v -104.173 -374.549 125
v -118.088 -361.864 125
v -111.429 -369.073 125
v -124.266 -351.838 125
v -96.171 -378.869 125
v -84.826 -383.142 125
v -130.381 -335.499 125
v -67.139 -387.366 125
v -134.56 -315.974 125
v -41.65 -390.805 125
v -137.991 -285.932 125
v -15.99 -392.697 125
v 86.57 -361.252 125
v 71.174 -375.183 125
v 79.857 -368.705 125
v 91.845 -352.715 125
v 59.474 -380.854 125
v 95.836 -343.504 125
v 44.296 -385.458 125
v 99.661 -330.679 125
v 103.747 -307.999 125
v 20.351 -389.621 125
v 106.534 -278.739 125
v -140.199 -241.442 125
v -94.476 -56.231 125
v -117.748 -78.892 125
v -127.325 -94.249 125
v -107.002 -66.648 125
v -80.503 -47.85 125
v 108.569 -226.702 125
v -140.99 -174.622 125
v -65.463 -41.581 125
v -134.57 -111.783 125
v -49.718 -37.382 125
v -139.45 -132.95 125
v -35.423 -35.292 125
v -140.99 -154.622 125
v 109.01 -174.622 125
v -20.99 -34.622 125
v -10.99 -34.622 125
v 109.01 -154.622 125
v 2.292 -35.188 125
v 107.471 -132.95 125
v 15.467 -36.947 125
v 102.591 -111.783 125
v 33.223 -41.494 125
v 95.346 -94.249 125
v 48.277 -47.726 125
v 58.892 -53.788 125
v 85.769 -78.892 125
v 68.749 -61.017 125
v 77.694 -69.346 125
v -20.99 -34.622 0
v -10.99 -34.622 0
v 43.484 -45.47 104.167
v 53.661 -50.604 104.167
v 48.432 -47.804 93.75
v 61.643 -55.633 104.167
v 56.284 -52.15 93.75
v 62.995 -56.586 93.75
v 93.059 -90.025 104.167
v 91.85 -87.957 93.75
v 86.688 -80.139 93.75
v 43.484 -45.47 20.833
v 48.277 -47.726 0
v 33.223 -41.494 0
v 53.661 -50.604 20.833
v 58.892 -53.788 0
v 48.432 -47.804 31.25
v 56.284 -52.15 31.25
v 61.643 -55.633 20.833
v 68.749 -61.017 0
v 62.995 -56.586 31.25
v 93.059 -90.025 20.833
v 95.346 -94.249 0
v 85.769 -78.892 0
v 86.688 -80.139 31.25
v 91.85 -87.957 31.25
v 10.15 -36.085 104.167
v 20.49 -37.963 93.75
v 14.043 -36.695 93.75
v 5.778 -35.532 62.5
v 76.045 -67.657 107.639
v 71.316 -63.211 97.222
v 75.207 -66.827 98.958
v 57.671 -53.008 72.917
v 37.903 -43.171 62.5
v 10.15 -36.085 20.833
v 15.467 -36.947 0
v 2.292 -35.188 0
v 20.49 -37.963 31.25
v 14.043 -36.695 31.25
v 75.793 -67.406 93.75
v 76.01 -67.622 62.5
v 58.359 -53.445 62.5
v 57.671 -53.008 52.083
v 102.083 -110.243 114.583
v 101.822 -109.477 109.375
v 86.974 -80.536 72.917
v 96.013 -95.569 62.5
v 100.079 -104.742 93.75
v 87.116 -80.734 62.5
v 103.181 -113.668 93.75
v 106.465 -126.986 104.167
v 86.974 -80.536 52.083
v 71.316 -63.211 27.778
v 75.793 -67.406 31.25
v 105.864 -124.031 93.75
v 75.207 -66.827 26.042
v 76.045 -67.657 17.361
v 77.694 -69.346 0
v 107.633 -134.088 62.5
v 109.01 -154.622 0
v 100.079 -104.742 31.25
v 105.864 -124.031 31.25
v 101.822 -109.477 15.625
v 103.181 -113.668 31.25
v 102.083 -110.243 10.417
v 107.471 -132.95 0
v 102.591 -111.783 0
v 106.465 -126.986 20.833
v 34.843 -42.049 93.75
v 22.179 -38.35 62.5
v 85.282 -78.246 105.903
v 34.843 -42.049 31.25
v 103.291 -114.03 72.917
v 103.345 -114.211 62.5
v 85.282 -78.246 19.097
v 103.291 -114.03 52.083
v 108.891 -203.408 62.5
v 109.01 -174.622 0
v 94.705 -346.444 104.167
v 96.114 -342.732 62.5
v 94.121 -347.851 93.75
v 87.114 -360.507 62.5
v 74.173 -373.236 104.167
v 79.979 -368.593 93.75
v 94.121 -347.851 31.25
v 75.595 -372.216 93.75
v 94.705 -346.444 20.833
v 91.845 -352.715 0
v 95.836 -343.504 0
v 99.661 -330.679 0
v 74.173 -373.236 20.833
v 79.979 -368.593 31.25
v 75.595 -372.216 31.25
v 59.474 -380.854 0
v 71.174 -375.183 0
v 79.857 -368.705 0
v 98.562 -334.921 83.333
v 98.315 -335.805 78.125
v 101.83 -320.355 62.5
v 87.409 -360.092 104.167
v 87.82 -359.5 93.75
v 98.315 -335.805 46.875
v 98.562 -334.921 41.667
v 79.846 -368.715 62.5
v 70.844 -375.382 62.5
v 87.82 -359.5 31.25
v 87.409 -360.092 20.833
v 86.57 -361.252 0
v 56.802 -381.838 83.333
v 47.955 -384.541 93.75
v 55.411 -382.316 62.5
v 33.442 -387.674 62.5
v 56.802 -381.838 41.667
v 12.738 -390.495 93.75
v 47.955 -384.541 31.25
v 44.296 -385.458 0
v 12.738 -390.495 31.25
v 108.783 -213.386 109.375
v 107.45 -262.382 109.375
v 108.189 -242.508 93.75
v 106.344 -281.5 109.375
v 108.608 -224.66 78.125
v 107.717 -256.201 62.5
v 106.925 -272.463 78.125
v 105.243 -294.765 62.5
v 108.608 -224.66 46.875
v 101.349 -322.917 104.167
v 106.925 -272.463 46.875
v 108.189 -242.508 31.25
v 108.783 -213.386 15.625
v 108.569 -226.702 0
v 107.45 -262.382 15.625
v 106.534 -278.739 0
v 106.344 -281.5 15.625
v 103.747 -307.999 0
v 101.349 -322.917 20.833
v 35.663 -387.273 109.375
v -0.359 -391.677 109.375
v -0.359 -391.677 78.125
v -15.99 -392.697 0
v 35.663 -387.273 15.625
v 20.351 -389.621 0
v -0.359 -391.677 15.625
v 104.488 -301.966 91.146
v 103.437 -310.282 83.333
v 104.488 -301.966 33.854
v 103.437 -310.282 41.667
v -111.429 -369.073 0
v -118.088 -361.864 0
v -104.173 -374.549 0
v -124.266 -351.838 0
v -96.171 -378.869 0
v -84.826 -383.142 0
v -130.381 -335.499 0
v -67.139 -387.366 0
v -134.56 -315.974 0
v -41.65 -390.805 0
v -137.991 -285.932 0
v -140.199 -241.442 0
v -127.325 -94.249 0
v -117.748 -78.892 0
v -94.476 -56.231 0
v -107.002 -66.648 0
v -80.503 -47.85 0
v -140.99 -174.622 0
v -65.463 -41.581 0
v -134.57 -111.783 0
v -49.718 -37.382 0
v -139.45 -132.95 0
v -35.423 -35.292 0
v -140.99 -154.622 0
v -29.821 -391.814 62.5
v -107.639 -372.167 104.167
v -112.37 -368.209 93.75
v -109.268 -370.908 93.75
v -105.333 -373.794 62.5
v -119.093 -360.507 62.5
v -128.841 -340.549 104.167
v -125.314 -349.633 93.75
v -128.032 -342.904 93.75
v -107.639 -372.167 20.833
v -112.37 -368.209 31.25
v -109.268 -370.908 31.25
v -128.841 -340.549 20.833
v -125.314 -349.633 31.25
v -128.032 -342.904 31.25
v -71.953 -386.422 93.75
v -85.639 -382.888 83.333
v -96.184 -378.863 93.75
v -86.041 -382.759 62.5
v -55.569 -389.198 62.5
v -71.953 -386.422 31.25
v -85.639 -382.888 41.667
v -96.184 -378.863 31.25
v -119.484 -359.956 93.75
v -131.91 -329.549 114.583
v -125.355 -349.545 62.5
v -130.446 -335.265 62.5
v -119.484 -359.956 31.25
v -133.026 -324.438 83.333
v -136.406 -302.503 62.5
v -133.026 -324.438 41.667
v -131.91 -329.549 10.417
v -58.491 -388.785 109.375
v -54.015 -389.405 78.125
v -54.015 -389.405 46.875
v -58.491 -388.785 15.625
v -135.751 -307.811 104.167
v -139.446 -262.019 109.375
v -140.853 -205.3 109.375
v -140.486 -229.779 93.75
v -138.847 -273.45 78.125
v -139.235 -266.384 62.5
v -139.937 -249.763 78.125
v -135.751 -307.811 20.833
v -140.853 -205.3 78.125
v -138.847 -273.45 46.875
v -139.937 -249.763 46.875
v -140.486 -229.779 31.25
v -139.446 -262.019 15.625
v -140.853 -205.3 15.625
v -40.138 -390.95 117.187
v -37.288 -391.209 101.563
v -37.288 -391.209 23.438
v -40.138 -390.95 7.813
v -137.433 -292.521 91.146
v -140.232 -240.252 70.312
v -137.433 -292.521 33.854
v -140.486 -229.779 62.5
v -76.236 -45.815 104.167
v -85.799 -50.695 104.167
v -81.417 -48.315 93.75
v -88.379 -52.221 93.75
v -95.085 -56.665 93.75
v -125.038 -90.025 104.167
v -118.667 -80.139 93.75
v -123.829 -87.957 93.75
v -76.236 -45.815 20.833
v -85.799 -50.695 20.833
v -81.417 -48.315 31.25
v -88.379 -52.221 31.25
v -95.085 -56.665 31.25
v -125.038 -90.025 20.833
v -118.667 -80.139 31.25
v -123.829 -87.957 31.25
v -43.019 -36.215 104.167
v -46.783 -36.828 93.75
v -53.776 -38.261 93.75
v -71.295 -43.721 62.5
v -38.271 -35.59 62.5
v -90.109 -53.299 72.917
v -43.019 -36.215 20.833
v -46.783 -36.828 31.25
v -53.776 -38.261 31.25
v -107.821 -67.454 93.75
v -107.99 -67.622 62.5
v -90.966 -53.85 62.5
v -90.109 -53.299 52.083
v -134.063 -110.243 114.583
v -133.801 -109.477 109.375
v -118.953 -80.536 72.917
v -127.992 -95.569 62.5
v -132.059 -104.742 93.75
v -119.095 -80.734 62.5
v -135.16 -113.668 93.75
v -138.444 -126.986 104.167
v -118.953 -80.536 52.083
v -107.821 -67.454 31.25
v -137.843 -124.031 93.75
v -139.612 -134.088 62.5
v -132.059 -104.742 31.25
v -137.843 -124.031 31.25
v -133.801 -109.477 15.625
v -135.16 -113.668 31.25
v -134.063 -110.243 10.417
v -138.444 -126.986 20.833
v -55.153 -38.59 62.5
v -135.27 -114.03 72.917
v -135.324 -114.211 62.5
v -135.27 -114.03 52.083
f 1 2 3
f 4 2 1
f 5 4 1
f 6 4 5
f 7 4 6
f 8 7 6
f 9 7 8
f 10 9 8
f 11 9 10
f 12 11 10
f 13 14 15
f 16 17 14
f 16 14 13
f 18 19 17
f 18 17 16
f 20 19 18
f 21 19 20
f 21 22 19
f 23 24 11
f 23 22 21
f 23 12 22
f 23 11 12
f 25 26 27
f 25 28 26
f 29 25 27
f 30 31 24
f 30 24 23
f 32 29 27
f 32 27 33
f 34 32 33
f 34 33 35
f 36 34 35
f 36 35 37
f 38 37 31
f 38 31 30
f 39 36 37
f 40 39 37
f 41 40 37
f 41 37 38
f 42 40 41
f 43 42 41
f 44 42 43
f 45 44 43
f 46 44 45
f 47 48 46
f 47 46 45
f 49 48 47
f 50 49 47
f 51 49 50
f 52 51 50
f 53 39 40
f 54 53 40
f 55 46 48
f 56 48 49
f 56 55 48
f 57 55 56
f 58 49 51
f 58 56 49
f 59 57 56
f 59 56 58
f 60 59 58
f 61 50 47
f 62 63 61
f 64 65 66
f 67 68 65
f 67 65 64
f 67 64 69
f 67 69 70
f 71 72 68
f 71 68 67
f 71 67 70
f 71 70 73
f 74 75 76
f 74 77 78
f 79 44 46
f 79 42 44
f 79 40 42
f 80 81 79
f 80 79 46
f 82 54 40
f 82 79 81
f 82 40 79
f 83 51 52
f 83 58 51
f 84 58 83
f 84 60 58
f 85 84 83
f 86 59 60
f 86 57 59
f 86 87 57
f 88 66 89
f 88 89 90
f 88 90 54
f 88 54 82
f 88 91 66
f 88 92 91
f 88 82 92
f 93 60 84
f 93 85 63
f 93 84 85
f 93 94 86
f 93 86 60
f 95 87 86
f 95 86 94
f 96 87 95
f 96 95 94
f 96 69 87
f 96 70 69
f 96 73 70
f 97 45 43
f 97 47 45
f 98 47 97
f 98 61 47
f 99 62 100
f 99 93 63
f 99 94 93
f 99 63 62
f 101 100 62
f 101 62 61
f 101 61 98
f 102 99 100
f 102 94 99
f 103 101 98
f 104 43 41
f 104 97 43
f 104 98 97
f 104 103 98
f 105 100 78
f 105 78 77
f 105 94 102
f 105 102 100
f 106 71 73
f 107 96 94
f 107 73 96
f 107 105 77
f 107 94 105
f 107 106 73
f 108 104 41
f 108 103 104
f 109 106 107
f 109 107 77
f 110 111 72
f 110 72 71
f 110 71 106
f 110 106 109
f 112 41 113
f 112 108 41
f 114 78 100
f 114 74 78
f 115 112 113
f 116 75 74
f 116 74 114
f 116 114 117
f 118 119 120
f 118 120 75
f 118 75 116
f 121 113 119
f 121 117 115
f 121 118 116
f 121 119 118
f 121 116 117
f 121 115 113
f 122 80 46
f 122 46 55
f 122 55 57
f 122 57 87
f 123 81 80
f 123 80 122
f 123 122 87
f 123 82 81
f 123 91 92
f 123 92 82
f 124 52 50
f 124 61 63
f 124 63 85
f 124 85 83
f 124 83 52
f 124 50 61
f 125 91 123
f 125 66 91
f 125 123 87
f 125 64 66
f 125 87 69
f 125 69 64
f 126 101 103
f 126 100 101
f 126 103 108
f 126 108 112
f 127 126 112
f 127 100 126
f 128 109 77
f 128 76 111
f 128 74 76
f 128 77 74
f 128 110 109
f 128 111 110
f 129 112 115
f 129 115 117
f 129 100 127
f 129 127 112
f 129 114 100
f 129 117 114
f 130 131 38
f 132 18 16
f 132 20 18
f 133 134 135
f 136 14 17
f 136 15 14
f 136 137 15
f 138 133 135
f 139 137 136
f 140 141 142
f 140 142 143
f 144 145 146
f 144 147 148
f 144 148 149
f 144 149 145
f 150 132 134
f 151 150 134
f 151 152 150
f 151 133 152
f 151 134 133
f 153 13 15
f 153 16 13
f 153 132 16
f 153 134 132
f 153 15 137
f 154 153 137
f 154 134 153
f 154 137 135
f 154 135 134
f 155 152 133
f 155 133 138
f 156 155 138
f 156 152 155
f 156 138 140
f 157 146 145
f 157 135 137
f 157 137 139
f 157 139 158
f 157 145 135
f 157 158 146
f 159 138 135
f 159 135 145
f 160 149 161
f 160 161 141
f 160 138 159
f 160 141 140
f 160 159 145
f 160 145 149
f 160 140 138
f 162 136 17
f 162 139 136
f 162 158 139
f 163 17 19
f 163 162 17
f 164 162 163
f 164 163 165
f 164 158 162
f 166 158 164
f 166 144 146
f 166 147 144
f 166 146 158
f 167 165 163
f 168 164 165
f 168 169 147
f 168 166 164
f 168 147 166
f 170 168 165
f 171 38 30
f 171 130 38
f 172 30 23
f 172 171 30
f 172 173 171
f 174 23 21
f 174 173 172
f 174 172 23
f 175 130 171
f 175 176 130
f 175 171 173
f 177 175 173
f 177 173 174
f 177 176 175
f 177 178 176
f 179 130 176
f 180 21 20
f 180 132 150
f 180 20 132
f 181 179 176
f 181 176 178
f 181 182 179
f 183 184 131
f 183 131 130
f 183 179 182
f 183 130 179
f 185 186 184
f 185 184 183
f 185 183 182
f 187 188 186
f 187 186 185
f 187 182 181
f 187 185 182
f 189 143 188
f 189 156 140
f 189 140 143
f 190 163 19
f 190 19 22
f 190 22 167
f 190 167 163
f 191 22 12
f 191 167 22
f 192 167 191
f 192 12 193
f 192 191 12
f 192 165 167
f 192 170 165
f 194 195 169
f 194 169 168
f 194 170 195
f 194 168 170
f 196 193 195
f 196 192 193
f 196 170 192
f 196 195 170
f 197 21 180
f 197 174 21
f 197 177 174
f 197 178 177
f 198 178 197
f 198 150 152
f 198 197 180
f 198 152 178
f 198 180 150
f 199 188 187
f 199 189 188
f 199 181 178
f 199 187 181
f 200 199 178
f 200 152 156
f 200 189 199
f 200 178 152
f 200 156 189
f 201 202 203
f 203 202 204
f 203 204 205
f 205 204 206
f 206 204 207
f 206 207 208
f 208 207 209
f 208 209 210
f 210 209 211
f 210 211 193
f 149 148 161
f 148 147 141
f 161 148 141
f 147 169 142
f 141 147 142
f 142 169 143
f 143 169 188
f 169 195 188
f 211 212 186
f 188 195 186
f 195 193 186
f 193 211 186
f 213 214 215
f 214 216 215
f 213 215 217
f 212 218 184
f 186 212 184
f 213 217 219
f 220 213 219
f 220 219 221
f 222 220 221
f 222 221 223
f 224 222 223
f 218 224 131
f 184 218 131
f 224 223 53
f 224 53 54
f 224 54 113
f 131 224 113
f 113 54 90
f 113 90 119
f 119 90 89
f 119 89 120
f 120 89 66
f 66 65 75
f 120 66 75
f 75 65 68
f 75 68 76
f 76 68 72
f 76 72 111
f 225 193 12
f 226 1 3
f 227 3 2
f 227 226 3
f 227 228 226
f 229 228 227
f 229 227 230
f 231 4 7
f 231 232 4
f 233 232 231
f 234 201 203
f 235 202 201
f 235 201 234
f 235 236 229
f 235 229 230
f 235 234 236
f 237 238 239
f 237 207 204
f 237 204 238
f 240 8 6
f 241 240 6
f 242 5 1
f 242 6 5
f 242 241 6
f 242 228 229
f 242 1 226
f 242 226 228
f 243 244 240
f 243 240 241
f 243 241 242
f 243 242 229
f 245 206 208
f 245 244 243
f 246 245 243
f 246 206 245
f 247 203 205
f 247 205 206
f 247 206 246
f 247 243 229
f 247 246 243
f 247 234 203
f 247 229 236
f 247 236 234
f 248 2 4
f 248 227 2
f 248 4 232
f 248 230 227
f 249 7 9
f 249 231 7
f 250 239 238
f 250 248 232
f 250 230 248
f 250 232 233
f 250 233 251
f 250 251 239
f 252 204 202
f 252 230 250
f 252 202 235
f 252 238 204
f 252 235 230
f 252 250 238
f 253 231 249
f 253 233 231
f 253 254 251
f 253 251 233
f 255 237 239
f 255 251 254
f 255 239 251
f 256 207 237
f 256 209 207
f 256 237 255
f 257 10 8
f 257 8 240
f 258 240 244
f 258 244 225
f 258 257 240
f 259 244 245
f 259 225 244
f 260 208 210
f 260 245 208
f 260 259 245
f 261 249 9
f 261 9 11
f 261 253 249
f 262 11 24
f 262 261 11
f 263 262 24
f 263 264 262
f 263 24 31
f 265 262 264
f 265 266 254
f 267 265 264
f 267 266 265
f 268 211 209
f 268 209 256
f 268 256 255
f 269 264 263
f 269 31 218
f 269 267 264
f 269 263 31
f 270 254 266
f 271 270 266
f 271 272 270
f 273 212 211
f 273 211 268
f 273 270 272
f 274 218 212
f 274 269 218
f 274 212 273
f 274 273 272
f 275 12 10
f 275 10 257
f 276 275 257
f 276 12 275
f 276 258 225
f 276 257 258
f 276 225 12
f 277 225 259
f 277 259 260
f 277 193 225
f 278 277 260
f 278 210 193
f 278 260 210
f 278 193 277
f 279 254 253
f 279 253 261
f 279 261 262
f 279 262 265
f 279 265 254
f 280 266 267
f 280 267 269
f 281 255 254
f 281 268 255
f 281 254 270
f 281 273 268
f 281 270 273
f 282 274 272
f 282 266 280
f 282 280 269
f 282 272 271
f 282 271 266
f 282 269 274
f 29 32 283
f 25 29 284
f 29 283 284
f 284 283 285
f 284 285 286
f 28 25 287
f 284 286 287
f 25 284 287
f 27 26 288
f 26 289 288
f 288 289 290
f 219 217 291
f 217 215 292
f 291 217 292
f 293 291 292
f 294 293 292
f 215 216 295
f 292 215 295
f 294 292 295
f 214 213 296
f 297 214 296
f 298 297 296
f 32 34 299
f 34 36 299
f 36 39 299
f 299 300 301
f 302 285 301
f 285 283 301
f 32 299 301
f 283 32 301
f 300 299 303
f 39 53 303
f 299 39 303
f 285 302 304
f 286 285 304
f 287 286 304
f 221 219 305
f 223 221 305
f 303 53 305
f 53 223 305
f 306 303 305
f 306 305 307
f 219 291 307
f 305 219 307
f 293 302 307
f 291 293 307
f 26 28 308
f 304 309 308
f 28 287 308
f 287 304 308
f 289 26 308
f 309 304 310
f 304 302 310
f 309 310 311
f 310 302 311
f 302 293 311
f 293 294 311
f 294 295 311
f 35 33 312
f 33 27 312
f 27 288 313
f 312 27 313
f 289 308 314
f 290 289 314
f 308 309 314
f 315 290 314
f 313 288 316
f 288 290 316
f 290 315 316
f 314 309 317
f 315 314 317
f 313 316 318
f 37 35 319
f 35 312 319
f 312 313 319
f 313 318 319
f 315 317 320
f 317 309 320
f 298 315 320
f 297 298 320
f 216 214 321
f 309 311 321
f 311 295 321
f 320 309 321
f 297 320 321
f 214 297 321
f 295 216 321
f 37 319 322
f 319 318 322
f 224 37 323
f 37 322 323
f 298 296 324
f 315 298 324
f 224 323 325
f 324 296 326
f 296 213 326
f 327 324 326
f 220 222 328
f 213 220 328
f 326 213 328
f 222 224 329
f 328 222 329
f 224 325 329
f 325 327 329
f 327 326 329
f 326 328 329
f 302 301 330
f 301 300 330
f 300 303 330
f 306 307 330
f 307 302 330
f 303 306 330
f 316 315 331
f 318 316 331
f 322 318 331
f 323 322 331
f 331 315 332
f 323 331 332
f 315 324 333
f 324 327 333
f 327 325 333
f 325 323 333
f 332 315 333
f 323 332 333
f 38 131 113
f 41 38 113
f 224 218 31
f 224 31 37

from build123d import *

# Parameters (mm, degrees)
SKETCH1_W           = 250
SKETCH1_H           = 360
BOSS_EXTRUDE7_DEPTH = 125
FILLET5_SIZE        = 220
FILLET3_SIZE        = 120


with BuildPart() as part:
    # Sketch1 → Boss-Extrude7 (new body)
    with BuildSketch(Plane.XY):
        with Locations((-15.989583333, -214.622395833)):
            Rectangle(SKETCH1_W, SKETCH1_H)
    extrude(amount=BOSS_EXTRUDE7_DEPTH)

    # Fillet5
    # a fillet whose section is not a circle: 220 mm, written as the material it takes off along each edge
    with BuildSketch(Plane(origin=(109.010416667, -394.622395833, -550), x_dir=(0, 1, 0), z_dir=(0, 0, 1)), Plane(origin=(-140.989583333, -394.622395833, -550), x_dir=(1, 0, 0), z_dir=(0, 0, 1))) as fillet5_piece_1:
        with BuildLine():
            Bezier((FILLET5_SIZE, 0), (0, 0), (0, FILLET5_SIZE), weights=[1, 3, 1])
            Line((0, FILLET5_SIZE), (0, 0))
            Line((0, 0), (FILLET5_SIZE, 0))
        make_face()
    extrude(amount=1225, mode=Mode.SUBTRACT)

    # Fillet3
    # a fillet whose section is not a circle: 120 mm, written as the material it takes off along each edge
    with BuildSketch(Plane(origin=(109.010416667, -34.622395833, -300), x_dir=(-1, 0, 0), z_dir=(0, 0, 1))) as fillet3_piece_1:
        with BuildLine():
            Bezier((FILLET3_SIZE, 0), (0, 0), (0, FILLET3_SIZE), weights=[1, 0.818181818, 1])
            Line((0, FILLET3_SIZE), (0, 0))
            Line((0, 0), (FILLET3_SIZE, 0))
        make_face()
    extrude(amount=725, mode=Mode.SUBTRACT)
    with BuildSketch(Plane(origin=(-140.989583333, -34.622395833, -300), x_dir=(1, 0, 0), z_dir=(0, 0, 1))) as fillet3_piece_2:
        with BuildLine():
            Bezier((FILLET3_SIZE, 0), (0, 0), (0, -FILLET3_SIZE), weights=[1, 0.818181818, 1])
            Line((0, -FILLET3_SIZE), (0, 0))
            Line((0, 0), (FILLET3_SIZE, 0))
        make_face()
    extrude(amount=725, mode=Mode.SUBTRACT)


solid = part.part
